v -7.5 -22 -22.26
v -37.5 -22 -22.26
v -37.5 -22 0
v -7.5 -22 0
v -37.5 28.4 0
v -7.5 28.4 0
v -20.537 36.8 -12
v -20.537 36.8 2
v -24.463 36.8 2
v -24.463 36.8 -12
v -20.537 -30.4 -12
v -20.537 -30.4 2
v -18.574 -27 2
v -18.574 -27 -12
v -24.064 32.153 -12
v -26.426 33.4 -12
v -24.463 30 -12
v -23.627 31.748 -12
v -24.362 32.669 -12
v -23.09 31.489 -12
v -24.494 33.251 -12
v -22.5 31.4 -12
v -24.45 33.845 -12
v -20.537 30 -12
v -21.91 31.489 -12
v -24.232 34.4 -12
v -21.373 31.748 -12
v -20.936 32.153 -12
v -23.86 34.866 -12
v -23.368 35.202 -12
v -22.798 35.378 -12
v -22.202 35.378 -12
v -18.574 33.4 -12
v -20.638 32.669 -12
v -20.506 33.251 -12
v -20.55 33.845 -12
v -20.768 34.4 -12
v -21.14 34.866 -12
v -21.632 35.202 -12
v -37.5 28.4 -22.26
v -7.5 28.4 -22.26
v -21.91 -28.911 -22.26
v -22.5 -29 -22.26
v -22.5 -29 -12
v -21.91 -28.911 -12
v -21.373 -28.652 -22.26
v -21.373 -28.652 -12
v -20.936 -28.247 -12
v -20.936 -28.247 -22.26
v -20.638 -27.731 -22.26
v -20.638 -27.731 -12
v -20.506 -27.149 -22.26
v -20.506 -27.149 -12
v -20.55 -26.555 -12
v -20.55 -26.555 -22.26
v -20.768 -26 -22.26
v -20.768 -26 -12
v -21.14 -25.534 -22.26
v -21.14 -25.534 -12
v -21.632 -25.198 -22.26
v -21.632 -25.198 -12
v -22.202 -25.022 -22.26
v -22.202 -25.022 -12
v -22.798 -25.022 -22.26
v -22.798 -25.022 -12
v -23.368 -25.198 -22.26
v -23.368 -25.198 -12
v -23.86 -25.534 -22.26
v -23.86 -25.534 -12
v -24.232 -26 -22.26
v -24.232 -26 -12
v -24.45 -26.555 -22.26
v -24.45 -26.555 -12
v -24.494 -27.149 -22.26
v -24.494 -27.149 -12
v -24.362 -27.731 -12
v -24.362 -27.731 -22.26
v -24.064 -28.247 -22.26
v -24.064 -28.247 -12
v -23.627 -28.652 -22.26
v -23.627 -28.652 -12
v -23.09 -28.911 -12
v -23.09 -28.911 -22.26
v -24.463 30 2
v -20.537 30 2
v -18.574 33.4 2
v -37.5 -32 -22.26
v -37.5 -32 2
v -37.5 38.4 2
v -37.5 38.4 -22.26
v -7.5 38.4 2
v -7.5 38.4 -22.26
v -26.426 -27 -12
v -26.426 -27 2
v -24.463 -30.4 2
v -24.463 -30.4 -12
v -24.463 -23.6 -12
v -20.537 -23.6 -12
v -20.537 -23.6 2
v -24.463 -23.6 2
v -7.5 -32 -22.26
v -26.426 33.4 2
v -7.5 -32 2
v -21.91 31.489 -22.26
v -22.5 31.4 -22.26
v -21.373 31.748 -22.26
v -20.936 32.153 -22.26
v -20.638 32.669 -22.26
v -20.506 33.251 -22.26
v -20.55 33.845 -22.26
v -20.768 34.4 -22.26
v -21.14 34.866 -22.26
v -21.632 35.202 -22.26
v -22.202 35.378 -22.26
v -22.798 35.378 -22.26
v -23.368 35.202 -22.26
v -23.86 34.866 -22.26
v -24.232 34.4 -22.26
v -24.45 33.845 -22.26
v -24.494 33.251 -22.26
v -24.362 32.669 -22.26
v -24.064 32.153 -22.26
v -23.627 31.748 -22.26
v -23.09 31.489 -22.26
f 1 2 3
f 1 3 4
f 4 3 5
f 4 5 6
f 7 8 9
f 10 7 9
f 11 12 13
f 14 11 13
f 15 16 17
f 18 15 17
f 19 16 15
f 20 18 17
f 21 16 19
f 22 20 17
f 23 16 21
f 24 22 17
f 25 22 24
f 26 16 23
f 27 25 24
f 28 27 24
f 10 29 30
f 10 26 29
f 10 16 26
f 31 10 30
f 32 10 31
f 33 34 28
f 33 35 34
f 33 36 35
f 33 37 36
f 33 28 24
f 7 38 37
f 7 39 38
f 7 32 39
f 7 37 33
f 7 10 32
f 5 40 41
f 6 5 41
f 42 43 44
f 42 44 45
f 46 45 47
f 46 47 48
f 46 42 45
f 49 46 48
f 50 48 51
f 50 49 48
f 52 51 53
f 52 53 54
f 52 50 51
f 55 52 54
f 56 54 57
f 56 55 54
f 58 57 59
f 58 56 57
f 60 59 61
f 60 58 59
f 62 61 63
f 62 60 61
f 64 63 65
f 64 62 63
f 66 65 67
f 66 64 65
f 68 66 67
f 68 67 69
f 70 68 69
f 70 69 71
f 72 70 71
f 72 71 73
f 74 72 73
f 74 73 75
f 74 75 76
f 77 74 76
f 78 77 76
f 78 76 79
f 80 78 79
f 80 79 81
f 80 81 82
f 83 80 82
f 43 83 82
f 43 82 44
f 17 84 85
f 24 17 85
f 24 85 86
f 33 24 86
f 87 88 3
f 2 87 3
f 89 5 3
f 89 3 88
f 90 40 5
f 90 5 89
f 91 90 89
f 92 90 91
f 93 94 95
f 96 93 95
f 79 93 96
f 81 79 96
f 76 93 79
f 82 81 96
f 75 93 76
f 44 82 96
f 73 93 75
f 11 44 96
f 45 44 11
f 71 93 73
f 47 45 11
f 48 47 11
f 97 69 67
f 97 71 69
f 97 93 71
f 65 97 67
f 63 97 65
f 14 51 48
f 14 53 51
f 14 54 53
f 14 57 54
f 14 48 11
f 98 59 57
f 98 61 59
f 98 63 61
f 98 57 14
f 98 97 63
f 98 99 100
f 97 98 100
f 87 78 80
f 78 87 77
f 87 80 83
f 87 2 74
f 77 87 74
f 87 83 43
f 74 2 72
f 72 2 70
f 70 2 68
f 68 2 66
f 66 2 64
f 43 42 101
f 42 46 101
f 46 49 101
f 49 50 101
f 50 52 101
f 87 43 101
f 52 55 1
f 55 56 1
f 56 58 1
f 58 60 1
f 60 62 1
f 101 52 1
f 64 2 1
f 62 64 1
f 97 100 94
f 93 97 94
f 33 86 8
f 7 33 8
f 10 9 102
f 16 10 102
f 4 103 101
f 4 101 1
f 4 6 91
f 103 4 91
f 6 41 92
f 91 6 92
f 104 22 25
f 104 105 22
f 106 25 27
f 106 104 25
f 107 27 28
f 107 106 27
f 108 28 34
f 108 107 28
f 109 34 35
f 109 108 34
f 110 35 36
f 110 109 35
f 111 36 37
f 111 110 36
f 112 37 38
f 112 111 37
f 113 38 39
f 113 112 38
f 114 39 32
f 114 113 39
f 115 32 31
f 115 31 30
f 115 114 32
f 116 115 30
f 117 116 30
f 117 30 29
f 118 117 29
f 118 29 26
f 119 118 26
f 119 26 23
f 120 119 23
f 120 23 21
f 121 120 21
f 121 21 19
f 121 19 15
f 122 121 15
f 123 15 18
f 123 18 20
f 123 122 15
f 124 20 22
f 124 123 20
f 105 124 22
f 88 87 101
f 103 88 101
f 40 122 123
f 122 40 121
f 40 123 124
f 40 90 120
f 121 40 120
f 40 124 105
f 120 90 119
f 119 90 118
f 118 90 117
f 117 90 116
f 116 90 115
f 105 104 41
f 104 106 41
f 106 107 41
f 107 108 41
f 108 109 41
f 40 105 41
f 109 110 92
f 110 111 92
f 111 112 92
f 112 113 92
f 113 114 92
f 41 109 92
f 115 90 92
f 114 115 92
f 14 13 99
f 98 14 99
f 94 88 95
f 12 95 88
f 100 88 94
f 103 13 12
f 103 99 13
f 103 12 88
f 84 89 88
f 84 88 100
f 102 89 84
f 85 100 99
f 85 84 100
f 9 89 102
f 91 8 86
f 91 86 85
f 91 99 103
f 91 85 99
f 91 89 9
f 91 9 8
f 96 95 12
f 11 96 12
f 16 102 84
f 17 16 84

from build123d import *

# Parameters (mm, degrees)
SKETCH2_W           = 30
SKETCH2_H           = 70.4
SKETCH2_R           = 2
BOSS_EXTRUDE1_DEPTH = 2
BOSS_EXTRUDE2_START = -22.26
SKETCH2_2_W         = 30
SKETCH2_2_H         = 10
SKETCH2_2_R         = 2
BOSS_EXTRUDE2_DEPTH = 22.26
CUT_EXTRUDE1_DEPTH  = 14


with BuildPart() as part:
    # Sketch2 → Boss-Extrude1 (new body)
    with BuildSketch(Plane.XY):
        with Locations((-22.5, 3.2)):
            Rectangle(SKETCH2_W, SKETCH2_H)
        with Locations((-22.5, -27)):
            Circle(SKETCH2_R, mode=Mode.SUBTRACT)
        with Locations((-22.5, 33.4)):
            Circle(SKETCH2_R, mode=Mode.SUBTRACT)
    extrude(amount=BOSS_EXTRUDE1_DEPTH)

    # Sketch2<2> → Boss-Extrude2 (add)
    # profile 1 of 2: a face of its own
    with BuildSketch(Plane.XY.offset(BOSS_EXTRUDE2_START)):
        with Locations((-22.5, -27)):
            Rectangle(SKETCH2_2_W, SKETCH2_2_H)
        with Locations(Location((-22.5, -27, 0), (0, 0, 270))):
            Circle(SKETCH2_2_R, mode=Mode.SUBTRACT)
    # profile 2 of 2: a face of its own
    with BuildSketch(Plane.XY.offset(BOSS_EXTRUDE2_START)):
        with Locations((-22.5, 33.4)):
            Rectangle(SKETCH2_2_W, SKETCH2_2_H)
        with Locations(Location((-22.5, 33.4, 0), (0, 0, 270))):
            Circle(SKETCH2_2_R, mode=Mode.SUBTRACT)
    extrude(amount=BOSS_EXTRUDE2_DEPTH)

    # Sketch3 → Cut-Extrude1 (cut)
    with BuildSketch(Plane.XY.offset(2)):
        Polygon((-24.462990915, 30), (-20.537009085, 30), (-18.57401817, 33.4), (-20.537009085, 36.8), (-24.462990915, 36.8), (-26.42598183, 33.4), align=None)
        Polygon((-20.537009085, -30.4), (-18.57401817, -27), (-20.537009085, -23.6), (-24.462990915, -23.6), (-26.42598183, -27), (-24.462990915, -30.4), align=None)
    extrude(amount=-CUT_EXTRUDE1_DEPTH, mode=Mode.SUBTRACT)


solid = part.part
